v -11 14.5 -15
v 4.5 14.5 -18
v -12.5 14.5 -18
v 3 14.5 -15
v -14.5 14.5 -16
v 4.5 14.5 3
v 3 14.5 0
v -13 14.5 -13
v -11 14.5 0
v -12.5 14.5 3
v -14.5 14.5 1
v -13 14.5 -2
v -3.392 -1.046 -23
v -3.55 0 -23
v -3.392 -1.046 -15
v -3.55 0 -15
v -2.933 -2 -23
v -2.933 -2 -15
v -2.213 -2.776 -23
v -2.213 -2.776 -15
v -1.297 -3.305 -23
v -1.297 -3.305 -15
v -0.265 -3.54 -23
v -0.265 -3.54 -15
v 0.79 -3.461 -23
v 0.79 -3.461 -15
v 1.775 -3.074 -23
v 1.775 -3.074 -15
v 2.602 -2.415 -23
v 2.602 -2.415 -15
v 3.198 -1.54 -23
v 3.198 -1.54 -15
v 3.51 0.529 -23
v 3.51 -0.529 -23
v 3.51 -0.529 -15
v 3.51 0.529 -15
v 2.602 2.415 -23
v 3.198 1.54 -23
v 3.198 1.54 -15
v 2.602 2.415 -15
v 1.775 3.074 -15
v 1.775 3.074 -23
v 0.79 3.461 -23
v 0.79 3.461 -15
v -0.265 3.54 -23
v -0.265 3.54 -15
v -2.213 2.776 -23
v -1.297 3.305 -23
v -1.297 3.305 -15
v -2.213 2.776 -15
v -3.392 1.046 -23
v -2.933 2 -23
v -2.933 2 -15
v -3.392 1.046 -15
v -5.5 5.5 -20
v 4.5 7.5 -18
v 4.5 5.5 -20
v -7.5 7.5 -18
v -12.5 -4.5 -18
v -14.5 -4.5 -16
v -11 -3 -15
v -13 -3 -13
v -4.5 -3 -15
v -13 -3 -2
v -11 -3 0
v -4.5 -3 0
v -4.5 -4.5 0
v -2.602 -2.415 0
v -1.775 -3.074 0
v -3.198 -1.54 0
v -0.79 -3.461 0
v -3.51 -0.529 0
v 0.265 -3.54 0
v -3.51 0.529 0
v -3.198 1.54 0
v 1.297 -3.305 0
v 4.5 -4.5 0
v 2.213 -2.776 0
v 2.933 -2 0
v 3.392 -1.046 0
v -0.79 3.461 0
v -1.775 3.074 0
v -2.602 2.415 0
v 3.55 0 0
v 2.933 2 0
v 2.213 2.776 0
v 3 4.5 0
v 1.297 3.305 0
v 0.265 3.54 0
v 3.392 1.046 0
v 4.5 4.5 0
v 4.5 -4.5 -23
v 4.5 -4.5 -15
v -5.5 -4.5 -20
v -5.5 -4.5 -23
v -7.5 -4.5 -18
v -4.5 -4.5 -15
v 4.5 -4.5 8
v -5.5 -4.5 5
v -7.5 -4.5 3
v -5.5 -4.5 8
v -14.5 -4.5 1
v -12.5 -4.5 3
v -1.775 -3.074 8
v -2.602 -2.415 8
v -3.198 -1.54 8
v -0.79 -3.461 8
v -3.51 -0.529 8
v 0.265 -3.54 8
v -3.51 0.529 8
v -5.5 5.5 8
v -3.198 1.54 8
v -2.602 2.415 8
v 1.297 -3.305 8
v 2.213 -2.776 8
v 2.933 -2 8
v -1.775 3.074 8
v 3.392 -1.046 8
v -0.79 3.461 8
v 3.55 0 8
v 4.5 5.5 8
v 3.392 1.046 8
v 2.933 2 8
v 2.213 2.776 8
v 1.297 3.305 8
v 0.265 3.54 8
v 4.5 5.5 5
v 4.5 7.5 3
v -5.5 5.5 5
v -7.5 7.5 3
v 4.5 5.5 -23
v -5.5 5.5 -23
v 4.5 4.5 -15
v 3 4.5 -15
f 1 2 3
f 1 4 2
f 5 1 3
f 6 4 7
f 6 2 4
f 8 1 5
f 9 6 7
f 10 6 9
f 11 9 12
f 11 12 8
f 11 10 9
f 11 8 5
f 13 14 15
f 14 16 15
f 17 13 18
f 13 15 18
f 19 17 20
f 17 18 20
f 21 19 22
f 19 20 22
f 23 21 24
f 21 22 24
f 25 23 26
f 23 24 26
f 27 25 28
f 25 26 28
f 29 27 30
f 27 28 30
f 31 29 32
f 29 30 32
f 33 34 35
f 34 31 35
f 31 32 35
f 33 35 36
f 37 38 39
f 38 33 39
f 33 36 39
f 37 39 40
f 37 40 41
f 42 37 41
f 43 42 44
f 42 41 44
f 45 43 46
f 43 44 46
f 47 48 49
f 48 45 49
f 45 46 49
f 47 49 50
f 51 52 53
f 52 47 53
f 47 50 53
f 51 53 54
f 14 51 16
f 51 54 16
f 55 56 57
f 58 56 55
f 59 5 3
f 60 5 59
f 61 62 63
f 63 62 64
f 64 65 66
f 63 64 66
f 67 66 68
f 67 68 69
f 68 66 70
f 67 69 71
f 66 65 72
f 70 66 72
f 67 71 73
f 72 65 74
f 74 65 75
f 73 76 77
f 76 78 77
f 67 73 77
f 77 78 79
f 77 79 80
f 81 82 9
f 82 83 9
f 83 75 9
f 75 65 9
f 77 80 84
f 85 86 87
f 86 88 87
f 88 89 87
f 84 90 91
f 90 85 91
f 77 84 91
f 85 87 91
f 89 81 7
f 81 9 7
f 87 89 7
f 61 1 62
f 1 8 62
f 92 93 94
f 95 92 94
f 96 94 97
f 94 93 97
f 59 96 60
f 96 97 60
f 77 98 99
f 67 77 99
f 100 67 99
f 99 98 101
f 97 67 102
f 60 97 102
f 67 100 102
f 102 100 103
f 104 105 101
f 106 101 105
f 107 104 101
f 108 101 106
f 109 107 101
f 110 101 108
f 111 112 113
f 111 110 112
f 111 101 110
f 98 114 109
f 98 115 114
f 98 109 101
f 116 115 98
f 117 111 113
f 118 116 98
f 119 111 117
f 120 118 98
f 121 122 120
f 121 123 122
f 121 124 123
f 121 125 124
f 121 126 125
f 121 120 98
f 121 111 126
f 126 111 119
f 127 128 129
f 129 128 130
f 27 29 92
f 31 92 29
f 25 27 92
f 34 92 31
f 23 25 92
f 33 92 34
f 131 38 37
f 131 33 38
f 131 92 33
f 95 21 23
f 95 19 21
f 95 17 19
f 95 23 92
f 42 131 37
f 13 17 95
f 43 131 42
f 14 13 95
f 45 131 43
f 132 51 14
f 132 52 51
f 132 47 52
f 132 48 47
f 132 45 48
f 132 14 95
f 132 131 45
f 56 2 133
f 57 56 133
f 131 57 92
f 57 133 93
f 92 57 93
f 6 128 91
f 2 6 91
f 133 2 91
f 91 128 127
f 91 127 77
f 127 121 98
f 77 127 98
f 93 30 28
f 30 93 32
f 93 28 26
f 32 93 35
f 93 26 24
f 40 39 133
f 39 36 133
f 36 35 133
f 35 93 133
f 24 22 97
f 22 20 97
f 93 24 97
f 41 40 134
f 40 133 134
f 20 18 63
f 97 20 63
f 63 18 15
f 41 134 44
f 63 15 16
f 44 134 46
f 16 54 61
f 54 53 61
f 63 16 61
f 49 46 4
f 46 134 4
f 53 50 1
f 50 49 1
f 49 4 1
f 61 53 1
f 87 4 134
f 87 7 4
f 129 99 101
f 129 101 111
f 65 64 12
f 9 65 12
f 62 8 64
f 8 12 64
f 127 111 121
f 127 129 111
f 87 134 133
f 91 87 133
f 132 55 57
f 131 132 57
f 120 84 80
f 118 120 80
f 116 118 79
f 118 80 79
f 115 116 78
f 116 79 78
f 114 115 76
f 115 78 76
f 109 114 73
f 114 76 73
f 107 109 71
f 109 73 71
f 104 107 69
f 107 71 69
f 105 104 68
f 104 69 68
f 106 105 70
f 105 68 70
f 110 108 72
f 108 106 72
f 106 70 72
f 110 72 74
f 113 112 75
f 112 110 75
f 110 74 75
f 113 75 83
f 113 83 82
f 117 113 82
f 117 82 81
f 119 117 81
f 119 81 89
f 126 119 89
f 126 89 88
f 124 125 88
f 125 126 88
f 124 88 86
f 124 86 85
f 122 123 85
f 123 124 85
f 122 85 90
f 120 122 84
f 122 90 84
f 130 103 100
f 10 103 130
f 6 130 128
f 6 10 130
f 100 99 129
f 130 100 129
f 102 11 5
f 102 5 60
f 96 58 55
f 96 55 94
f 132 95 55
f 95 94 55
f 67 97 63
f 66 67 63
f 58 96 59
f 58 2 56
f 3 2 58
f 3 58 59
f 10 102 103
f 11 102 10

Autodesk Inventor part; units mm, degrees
ref_plane "YZ Plane" through (0, 0, 0) normal (1, 0, 0) x (0, 1, 0)
ref_plane "XZ Plane" through (0, 0, 0) normal (0, 1, 0) x (-1, 0, 0)
ref_plane "XY Plane" through (0, 0, 0) normal (0, 0, 1) x (1, 0, 0)
ref_plane "Arbeitsebene1" through (-22.9558, 17.7058, 46.5) normal (0, 0, -1) x (-1, 0, 0)
sketch "Skizze1" plane through (0, 0, 0) normal (0, 0, 1) x (1, 0, 0)
  circle A0 centre (0, 0) radius 3.55
  line L0 (-14.5, 14.5) -> (4.5, 14.5)
  line L1 (4.5, 14.5) -> (4.5, -4.5)
  line L2 (4.5, -4.5) -> (-14.5, -4.5)
  line L3 (-14.5, -4.5) -> (-14.5, 14.5)
  dimension "d0" = 7.1
  dimension "d1" = 19
  dimension "d2" = 19
  dimension "d3" = 4.5
  dimension "d4" = 4.5
extrude "Extrusion1" add sketch "Skizze1" along normal blind 3
sketch "Skizze2" plane through (0, 0, 0) normal (0, 0, -1) x (-1, 0, 0)
  line L0 (14.5, 14.5) -> (14.5, -4.5) projected
  line L1 (-4.5, 14.5) -> (14.5, 14.5) projected
  circle A0 centre (0, 0) radius 3.55 projected
  line L2 (14.5, -4.5) -> (-4.5, -4.5) projected
  line L3 (-4.5, -4.5) -> (-4.5, 14.5) projected
  line L4 (-4.5, 14.5) -> (14.5, 14.5)
  line L5 (14.5, 14.5) -> (14.5, -4.5)
  line L6 (14.5, -4.5) -> (-4.5, -4.5)
  line L7 (-4.5, -4.5) -> (-4.5, 14.5)
  line L8 (-3, -4.5) -> (-3, 13)
  line L9 (-3, 13) -> (13, 13)
  line L10 (13, 13) -> (13, -3)
  line L11 (13, -3) -> (-0.4, -3)
  line L12 (-4.5, -4.5) -> (4.5, -4.5)
  line L13 (4.5, -4.5) -> (4.5, 4.5)
  line L14 (4.5, 4.5) -> (-4.5, 4.5)
  line L15 (-4.5, 4.5) -> (-4.5, -4.5)
  line L16 (-3, 13) -> (13, 13)
  line L17 (13, 13) -> (13, 14.5)
  line L18 (13, 14.5) -> (-3, 14.5)
  line L19 (-3, 14.5) -> (-3, 13)
  point P0 (4.5, -3)
  point P1 (4.5, -4.5)
  point P2 (13, 14.5)
  point P3 (-4.5, 4.5)
  point P4 (-3, 4.5)
  dimension "d13" = 1.5
  dimension "d14" = 9
  dimension "d15" = 9
extrude "Extrusion2" add sketch "Skizze2" along normal blind 15 contours L0 L2 L13 L11 L10 L17 L1 | L19 L8 L14 L3 L1
sketch "Skizze3" plane through (0, 0, -15) normal (0, 0, -1) x (-1, 0, 0)
  line L0 (-4.5, 14.5) -> (14.5, 14.5) projected
  line L1 (14.5, 14.5) -> (14.5, -4.5) projected
  circle A0 centre (0, 0) radius 3.55 projected
  line L2 (14.5, -4.5) -> (-4.5, -4.5) projected
  line L3 (-4.5, -4.5) -> (-4.5, 14.5) projected
extrude "Extrusion3" add sketch "Skizze3" along normal blind 3
sketch "Skizze4" plane through (0, 0, 3) normal (0, 0, 1) x (1, 0, 0)
  line L0 (-14.5, -4.5) -> (4.5, -4.5) projected
  line L1 (4.5, -4.5) -> (4.5, 14.5) projected
  line L2 (4.5, 14.5) -> (-14.5, 14.5) projected
  line L3 (-14.5, 14.5) -> (-14.5, -4.5) projected
  circle A0 centre (0, 0) radius 3.55 projected
  line L4 (4.5, -4.5) -> (-5.5, -4.5)
  line L5 (-5.5, -4.5) -> (-5.5, 5.5)
  line L6 (-5.5, 5.5) -> (4.5, 5.5)
  line L7 (4.5, 5.5) -> (4.5, -4.5)
  dimension "d16" = 10
  dimension "d17" = 10
extrude "Extrusion4" add sketch "Skizze4" along normal blind 5 contours L5 L6 L1 L0
sketch "Skizze5" plane through (0, 0, -18) normal (0, 0, -1) x (-1, 0, 0)
  line L0 (-4.5, -4.5) -> (14.5, -4.5) projected
  line L1 (14.5, -4.5) -> (14.5, 14.5) projected
  line L2 (14.5, 14.5) -> (-4.5, 14.5) projected
  line L3 (-4.5, 14.5) -> (-4.5, -4.5) projected
  circle A0 centre (0, 0) radius 3.55 projected
  line L4 (-4.5, -4.5) -> (5.5, -4.5)
  line L5 (5.5, -4.5) -> (5.5, 5.5)
  line L6 (5.5, 5.5) -> (-4.5, 5.5)
  line L7 (-4.5, 5.5) -> (-4.5, -4.5)
  dimension "d20" = 10
  dimension "d21" = 10
extrude "Extrusion5" add sketch "Skizze5" along normal blind 5 contours L3 L6 L5 L0
chamfer "Fasen1" distance 2 angle 45 8 edges at (-0.5, 5.5, 3) (-5.5, 0.5, 3) (-14.5, 5, 3) (-13, 5, 0) (-13, 5, -15) (-14.5, 5, -18) (-5.5, 0.5, -18) (-0.5, 5.5, -18)
properties part number "HolisheetCageSampleWater"
